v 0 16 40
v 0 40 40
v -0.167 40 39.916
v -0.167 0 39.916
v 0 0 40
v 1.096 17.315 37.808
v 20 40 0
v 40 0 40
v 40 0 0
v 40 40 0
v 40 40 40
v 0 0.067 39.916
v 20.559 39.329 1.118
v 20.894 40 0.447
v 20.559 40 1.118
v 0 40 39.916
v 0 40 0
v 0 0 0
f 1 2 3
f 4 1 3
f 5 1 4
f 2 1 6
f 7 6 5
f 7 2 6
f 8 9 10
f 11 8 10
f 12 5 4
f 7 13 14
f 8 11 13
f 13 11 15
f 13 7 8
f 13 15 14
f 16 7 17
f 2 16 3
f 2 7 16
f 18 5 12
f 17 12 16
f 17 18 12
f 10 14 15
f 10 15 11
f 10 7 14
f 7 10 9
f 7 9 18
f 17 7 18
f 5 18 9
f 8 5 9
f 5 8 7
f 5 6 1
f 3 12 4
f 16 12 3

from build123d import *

# Parameters (mm, degrees)
SKETCH1_W           = 40
SKETCH1_H           = 40
BOSS_EXTRUDE1_DEPTH = 40
CUT_EXTRUDE1_DEPTH  = 40
CUT_EXTRUDE3_DEPTH  = 40
CUT_EXTRUDE5_DEPTH  = 1
BOSS_EXTRUDE2_DEPTH = 26
CUT_EXTRUDE7_DEPTH  = 5
CUT_EXTRUDE8_DEPTH  = 5
CUT_EXTRUDE9_DEPTH  = 5
SKETCH10_W          = 40
SKETCH10_H          = 40
CUT_EXTRUDE10_DEPTH = 50
SKETCH11_W          = 56.739460666
SKETCH11_H          = 49.026259181
CUT_EXTRUDE11_DEPTH = 50


with BuildPart() as part:
    # Sketch1 → Boss-Extrude1 (new body)
    with BuildSketch(Plane.XY):
        with Locations((20, 20)):
            Rectangle(SKETCH1_W, SKETCH1_H)
    extrude(amount=BOSS_EXTRUDE1_DEPTH)

    # Sketch2 → Cut-Extrude1 (cut)
    with BuildSketch(Plane(origin=(0, 20, 20), x_dir=(1, 0, 0), z_dir=(0, 0.707106781, 0.707106781))):
        Polygon((40, -28.284271247), (0, -28.284271247), (20, 28.284271247), align=None)
    extrude(amount=CUT_EXTRUDE1_DEPTH, mode=Mode.SUBTRACT)

    # Sketch4 → Cut-Extrude3 (cut)
    with BuildSketch(Plane(origin=(16, 0, -8), x_dir=(0.447213595, 0, 0.894427191), z_dir=(-0.894427191, 0, 0.447213595))):
        Polygon((8.94427191, 40), (53.66563146, 40), (53.66563146, 0), align=None)
    extrude(amount=CUT_EXTRUDE3_DEPTH, mode=Mode.SUBTRACT)

    # Sketch5 → Cut-Extrude5 (cut)
    with BuildSketch(Plane(origin=(16, 0, 8), x_dir=(-0.447213595, 0, 0.894427191), z_dir=(-0.894427191, 0, -0.447213595))):
        Polygon((35.77708764, 0), (-8.94427191, 40), (29.348133104, 45.420073385), align=None)
    extrude(amount=-CUT_EXTRUDE5_DEPTH, mode=Mode.SUBTRACT)

    # Sketch6 → Boss-Extrude2 (add)
    with BuildSketch(Plane(origin=(16, 0, 8), x_dir=(-0.447213595, 0, 0.894427191), z_dir=(-0.894427191, 0, -0.447213595))):
        Polygon((35.77708764, 40), (35.77708764, 0), (-8.94427191, 40), align=None)
    extrude(amount=BOSS_EXTRUDE2_DEPTH)

    # Sketch7 → Cut-Extrude7 (cut)
    with BuildSketch(Plane(origin=(16, 0, 8), x_dir=(0.447213595, 0, -0.894427191), z_dir=(0.894427191, 0, 0.447213595))):
        Polygon((2.978893099, 34.664402987), (-35.77708764, 31.206354084), (-35.77708764, 16), (-33.326207642, 17.315280227), (-35.77708764, 0), align=None)
    extrude(amount=CUT_EXTRUDE7_DEPTH, mode=Mode.SUBTRACT)

    # Sketch8 → Cut-Extrude8 (cut)
    with BuildSketch(Plane(origin=(-15.685739325, 4.964580059, 31.37147865), x_dir=(-0.896620465, -0.069212396, -0.437357275), z_dir=(0.442799889, -0.140147395, -0.885599778))):
        Polygon((-21.749837593, 8.458308195), (-18.716733371, 11.192845531), (-17.494290991, -6.252250535), align=None)
    extrude(amount=-CUT_EXTRUDE8_DEPTH, mode=Mode.SUBTRACT)

    # Sketch9 → Cut-Extrude9 (cut)
    with BuildSketch(Plane(origin=(15.970902322, -3.85667421, 8.59577521), x_dir=(-0.450614766, 0.108815038, 0.88606186), z_dir=(-0.86130493, 0.207989032, -0.463567018))):
        Polygon((35.4424744, 15.010038766), (34.947973708, 15.305740233), (35.4424744, 0), align=None)
    extrude(amount=-CUT_EXTRUDE9_DEPTH, mode=Mode.SUBTRACT)

    # Sketch10 → Cut-Extrude10 (cut)
    with BuildSketch(Plane(origin=(0, 0, 0), x_dir=(-1, 0, 0), z_dir=(0, 0, -1))):
        with Locations((-20, 20)):
            Rectangle(SKETCH10_W, SKETCH10_H)
    extrude(amount=CUT_EXTRUDE10_DEPTH, mode=Mode.SUBTRACT)

    # Sketch11 → Cut-Extrude11 (cut)
    with BuildSketch(Plane.ZY):
        with Locations((11.546622416, 24.513129591)):
            Rectangle(SKETCH11_W, SKETCH11_H)
    extrude(amount=CUT_EXTRUDE11_DEPTH, mode=Mode.SUBTRACT)


solid = part.part
